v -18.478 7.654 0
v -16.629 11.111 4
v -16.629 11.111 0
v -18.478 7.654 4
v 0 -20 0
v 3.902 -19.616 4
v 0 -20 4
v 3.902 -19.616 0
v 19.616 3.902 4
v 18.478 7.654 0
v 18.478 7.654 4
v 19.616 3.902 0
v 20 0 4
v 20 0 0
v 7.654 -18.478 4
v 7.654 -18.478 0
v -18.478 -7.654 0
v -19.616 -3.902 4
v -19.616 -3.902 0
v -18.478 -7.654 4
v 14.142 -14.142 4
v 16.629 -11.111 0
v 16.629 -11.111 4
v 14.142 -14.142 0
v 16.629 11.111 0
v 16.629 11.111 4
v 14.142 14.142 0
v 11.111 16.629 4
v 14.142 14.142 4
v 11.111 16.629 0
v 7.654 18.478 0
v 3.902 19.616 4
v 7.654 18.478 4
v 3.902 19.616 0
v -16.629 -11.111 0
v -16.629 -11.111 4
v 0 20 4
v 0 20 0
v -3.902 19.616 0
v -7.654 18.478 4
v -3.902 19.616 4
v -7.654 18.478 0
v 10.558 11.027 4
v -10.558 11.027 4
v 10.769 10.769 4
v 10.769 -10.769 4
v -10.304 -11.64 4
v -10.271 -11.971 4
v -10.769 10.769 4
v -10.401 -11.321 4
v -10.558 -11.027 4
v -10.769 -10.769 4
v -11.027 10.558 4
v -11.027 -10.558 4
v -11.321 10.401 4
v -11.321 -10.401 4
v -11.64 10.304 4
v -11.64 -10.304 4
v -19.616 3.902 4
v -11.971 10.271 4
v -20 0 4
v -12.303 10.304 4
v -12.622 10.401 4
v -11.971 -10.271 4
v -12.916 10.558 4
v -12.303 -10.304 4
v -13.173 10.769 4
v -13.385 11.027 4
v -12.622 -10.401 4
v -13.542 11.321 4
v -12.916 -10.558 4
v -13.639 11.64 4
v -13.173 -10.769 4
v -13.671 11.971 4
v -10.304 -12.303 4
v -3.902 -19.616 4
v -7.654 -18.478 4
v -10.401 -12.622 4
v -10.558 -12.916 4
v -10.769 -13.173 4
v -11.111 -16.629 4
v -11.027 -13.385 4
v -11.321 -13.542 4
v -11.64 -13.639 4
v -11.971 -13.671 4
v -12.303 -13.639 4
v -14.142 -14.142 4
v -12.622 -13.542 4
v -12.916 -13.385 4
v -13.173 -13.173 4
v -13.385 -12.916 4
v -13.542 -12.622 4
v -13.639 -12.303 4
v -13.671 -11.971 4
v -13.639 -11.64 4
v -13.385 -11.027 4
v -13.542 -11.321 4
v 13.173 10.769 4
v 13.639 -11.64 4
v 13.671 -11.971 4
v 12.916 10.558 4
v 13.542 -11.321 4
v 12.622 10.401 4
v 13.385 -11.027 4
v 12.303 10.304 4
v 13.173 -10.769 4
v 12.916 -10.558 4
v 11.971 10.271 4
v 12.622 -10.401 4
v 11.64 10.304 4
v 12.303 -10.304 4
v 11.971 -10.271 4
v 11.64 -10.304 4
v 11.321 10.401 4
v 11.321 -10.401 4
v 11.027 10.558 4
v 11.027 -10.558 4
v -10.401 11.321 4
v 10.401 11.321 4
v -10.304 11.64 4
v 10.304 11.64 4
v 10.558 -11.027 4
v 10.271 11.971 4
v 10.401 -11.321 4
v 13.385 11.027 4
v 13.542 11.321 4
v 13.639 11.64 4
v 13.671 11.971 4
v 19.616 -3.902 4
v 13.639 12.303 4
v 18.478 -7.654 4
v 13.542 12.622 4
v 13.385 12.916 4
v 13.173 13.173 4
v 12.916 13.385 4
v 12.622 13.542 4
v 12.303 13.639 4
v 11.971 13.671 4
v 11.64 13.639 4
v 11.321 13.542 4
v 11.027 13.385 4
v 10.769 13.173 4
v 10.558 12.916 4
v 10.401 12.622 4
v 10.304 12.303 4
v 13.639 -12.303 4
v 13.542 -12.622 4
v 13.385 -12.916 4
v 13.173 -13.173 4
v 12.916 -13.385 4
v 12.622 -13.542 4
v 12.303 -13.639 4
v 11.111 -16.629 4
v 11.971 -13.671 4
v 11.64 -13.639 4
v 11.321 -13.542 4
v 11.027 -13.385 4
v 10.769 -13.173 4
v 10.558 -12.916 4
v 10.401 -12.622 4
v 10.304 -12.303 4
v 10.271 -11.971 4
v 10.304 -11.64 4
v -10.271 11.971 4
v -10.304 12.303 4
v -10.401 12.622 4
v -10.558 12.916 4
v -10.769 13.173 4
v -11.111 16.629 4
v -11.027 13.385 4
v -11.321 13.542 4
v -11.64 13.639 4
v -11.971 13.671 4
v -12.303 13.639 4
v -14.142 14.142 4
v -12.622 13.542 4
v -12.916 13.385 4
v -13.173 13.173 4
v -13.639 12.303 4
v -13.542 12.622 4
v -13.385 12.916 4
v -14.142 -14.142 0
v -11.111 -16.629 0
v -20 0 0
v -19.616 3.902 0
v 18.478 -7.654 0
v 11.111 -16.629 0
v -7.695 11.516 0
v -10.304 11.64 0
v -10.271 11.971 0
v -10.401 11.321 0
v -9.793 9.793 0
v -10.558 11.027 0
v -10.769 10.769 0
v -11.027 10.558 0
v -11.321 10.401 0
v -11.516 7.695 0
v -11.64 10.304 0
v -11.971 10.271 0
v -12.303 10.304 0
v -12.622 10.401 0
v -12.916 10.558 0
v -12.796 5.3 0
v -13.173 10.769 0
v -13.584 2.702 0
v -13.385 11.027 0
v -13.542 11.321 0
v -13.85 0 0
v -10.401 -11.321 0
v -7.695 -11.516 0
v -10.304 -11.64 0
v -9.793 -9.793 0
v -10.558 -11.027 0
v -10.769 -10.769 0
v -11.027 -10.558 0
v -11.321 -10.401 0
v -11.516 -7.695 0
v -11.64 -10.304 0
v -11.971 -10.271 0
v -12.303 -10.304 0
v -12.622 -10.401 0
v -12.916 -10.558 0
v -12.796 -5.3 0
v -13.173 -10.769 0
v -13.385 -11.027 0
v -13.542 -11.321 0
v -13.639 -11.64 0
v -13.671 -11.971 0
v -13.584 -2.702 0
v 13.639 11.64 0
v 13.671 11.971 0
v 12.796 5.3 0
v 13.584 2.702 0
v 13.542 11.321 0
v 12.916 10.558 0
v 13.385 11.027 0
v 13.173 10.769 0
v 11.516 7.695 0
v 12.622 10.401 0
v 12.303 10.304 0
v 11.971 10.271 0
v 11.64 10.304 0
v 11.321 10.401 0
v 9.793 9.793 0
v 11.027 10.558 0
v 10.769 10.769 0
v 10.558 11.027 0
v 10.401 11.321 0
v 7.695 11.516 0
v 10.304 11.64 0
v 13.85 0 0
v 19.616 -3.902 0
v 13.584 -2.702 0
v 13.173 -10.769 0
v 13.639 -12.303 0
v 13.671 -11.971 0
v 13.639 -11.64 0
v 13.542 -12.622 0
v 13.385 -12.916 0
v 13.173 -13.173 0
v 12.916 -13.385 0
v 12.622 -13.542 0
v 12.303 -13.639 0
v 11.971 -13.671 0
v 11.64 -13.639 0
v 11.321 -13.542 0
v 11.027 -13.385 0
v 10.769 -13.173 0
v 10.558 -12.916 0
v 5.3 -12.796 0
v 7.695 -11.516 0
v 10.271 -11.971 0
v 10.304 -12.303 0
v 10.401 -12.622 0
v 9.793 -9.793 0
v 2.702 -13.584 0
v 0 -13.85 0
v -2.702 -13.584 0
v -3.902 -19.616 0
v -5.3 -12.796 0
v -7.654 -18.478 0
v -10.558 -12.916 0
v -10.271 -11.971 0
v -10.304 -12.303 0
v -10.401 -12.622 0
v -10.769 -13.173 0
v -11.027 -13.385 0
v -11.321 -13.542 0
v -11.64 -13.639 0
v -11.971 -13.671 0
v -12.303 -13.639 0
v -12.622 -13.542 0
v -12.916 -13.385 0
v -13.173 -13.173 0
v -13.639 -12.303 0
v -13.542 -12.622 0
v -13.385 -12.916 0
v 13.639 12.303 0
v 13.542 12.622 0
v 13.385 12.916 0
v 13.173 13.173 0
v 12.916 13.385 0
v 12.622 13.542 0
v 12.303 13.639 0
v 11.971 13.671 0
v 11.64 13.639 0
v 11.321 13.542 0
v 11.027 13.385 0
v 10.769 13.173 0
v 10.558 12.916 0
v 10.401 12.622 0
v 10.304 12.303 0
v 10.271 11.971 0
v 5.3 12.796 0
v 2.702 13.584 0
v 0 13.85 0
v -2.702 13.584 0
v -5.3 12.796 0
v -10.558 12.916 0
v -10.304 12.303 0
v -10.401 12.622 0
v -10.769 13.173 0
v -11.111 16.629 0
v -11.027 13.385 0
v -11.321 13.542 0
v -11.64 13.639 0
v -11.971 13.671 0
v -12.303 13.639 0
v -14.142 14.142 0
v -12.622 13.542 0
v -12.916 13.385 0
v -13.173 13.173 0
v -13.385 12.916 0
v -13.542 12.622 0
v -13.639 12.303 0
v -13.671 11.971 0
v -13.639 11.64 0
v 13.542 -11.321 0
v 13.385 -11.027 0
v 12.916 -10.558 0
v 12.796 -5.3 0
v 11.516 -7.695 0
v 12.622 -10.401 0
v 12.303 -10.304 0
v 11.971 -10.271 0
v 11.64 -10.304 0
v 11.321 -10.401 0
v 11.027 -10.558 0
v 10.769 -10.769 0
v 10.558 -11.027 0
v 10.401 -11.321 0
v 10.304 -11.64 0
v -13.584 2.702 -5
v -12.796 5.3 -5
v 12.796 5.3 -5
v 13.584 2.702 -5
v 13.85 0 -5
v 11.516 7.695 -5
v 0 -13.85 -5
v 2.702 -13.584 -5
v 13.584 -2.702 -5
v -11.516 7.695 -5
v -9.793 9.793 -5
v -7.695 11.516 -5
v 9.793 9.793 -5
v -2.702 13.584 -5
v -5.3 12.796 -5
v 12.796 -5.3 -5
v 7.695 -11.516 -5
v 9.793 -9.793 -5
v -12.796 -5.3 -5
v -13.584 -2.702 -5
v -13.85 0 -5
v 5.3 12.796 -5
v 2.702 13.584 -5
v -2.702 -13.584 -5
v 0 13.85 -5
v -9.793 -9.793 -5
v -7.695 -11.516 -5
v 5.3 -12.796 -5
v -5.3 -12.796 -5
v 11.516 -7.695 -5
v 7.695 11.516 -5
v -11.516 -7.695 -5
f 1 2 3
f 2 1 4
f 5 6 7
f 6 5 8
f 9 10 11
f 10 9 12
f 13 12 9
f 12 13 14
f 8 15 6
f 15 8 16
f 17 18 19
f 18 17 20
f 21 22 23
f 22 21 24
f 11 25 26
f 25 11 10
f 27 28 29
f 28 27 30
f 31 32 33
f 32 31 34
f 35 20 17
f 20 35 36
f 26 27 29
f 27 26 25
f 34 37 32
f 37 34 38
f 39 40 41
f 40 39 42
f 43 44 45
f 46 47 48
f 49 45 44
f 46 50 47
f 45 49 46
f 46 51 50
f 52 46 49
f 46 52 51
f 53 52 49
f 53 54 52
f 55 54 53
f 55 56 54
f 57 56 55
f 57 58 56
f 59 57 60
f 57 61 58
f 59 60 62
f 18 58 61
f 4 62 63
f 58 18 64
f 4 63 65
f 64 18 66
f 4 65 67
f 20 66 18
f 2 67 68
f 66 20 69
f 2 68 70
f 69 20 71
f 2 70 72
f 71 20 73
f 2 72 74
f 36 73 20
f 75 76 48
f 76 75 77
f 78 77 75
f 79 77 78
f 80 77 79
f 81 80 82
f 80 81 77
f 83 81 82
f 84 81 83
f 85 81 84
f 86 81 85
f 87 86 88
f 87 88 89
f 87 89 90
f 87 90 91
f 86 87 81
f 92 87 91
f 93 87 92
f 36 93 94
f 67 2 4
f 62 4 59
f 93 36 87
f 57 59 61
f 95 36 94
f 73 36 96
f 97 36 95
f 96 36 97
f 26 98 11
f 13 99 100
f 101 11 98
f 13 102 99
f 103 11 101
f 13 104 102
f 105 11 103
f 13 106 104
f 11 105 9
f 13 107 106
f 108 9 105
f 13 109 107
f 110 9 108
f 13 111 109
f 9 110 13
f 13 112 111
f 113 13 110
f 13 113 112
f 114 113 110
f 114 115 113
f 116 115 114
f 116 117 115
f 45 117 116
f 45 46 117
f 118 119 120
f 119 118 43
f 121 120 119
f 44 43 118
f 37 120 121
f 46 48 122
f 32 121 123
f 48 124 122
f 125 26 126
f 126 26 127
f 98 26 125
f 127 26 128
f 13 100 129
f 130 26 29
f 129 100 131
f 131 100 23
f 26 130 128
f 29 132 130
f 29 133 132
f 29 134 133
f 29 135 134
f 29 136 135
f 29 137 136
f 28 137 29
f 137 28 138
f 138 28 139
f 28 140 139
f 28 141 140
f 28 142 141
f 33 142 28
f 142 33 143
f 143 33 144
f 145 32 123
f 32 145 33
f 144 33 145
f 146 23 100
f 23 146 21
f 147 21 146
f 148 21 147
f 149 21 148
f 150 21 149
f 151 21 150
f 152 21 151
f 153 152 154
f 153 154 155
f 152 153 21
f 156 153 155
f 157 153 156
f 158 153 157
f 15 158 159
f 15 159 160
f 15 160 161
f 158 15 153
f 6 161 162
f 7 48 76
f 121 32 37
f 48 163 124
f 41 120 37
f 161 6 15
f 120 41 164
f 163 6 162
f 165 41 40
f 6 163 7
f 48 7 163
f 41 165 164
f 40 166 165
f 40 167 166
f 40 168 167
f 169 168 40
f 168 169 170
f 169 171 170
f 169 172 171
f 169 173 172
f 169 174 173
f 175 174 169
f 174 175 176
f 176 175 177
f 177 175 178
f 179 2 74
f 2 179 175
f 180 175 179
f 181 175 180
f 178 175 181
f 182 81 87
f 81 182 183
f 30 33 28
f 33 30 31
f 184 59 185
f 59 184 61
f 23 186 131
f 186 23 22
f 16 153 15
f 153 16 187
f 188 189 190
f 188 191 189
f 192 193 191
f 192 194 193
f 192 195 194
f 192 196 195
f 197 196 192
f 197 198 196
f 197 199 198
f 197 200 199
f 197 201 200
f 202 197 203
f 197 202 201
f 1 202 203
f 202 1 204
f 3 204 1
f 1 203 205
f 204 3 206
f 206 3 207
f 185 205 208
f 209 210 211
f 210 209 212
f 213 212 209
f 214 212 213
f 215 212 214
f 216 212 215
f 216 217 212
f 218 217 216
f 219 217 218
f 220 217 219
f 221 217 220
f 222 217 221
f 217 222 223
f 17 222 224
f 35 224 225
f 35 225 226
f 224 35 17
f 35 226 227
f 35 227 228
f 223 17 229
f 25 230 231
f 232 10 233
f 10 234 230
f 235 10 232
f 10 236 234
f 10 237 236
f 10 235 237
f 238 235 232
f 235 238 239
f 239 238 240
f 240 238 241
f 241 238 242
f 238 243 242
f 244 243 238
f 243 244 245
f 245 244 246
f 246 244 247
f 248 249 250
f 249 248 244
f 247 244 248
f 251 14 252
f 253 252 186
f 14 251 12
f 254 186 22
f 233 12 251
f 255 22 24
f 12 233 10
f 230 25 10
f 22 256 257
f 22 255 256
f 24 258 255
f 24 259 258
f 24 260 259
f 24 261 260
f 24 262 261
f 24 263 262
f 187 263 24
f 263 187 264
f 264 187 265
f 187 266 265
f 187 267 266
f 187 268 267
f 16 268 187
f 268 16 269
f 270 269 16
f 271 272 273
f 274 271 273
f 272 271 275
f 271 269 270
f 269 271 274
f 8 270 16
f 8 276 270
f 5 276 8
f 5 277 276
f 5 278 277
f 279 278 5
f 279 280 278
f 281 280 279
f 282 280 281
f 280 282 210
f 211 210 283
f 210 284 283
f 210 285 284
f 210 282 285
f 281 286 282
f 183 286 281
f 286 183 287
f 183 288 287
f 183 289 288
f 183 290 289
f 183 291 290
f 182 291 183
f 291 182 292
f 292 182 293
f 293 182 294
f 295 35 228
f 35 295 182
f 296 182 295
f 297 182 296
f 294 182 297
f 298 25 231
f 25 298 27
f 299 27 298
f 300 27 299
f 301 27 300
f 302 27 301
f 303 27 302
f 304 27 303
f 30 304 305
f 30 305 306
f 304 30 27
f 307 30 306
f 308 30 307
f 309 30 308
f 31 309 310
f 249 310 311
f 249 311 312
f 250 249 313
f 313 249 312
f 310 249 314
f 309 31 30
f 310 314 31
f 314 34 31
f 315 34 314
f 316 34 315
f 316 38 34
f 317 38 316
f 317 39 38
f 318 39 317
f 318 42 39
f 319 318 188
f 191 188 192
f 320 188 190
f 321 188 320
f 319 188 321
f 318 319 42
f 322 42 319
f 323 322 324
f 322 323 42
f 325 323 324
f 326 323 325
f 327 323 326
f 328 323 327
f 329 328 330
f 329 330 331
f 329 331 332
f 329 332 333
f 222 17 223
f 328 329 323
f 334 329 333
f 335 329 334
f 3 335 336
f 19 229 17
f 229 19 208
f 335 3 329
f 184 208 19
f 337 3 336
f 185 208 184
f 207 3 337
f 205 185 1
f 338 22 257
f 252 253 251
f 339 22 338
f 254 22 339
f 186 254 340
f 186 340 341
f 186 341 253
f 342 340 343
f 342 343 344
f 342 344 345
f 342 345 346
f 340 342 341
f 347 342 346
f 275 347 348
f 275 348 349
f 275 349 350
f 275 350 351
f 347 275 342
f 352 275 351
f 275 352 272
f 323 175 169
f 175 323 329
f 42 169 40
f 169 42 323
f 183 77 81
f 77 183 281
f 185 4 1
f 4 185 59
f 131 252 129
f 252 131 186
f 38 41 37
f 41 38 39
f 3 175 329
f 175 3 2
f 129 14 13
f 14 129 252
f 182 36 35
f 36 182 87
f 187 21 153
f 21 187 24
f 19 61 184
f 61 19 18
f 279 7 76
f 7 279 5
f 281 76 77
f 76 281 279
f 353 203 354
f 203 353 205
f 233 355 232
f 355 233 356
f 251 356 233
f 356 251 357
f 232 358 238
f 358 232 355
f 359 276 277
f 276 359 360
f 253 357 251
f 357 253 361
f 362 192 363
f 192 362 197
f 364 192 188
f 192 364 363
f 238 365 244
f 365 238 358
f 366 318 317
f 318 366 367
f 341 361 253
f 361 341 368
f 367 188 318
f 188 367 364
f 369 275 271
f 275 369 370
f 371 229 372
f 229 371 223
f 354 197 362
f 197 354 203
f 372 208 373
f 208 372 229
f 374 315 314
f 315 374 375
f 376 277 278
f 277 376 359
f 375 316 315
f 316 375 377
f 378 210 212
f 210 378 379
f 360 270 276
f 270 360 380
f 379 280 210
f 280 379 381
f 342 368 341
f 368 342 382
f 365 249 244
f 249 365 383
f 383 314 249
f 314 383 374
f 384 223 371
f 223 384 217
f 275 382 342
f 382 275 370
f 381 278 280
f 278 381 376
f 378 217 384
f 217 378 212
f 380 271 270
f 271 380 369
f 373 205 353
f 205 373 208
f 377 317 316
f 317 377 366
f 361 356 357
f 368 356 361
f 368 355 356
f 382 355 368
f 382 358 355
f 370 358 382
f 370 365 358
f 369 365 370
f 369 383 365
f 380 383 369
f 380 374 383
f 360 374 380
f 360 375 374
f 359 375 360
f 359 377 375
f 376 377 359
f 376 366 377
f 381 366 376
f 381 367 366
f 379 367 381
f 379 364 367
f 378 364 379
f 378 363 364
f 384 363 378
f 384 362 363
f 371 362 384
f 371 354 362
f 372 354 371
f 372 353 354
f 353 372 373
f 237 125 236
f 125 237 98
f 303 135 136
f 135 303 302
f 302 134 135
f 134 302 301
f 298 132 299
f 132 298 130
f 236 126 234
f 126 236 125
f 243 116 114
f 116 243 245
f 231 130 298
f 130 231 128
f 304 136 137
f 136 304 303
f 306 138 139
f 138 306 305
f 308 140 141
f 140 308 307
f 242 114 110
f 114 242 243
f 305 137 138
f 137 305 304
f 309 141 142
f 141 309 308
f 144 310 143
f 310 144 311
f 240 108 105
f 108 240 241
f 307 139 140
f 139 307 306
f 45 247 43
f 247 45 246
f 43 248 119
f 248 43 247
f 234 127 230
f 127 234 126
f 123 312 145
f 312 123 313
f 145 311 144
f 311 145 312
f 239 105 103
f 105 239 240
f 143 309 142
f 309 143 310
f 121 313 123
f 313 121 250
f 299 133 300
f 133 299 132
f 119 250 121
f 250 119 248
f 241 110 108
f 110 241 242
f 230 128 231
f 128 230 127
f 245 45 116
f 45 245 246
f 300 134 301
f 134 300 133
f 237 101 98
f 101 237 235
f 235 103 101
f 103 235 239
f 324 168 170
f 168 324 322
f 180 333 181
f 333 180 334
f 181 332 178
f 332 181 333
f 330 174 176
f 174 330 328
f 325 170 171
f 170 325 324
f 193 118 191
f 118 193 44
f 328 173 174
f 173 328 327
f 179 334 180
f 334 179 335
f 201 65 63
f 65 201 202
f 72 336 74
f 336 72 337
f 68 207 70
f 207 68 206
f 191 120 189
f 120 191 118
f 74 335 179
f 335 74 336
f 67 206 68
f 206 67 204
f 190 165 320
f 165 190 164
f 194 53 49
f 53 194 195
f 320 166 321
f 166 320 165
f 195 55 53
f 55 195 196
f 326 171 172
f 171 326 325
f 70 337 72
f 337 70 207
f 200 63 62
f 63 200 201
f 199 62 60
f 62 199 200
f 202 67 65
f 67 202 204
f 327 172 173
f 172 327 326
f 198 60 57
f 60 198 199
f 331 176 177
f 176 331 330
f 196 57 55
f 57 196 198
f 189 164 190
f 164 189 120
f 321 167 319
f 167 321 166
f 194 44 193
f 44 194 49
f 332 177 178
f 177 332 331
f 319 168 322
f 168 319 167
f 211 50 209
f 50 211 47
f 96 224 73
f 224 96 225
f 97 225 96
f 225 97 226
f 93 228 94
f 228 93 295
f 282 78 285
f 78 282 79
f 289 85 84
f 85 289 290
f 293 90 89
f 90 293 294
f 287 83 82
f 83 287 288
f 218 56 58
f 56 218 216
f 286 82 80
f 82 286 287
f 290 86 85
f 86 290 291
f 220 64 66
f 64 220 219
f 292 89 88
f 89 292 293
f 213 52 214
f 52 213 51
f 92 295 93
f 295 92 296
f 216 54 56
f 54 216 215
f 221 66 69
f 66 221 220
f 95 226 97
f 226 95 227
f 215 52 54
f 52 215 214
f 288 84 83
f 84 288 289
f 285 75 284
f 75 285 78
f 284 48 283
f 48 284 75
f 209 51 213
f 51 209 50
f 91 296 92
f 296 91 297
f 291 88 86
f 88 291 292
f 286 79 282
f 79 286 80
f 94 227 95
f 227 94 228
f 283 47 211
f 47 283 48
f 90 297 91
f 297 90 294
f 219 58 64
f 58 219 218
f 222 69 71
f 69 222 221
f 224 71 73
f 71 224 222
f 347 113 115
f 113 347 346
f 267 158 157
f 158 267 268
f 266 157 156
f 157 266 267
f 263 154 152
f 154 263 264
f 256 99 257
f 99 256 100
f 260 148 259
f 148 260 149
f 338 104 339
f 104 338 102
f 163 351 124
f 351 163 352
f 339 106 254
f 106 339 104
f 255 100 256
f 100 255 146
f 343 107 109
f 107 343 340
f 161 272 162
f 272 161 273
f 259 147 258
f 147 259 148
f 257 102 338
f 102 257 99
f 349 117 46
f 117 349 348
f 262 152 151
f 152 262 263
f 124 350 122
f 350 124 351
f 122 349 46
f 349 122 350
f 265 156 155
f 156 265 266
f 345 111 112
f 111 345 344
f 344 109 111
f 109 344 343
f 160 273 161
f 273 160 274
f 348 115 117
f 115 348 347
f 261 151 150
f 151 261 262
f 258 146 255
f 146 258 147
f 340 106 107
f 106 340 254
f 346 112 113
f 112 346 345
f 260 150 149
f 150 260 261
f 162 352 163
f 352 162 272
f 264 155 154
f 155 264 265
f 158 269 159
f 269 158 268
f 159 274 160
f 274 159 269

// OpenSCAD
$fn = 32;

// ----------------------------------------------------------------------
// Retaining cap: 6001 cover, 40 mm, spigot 27.7 mm
// ----------------------------------------------------------------------

// --- parameters (mm) ---
plate_d = 40;             // cover diameter
plate_t = 4;              // cover thickness
boss_d = 27.7;            // spigot that enters the housing
boss_h = 5;               // spigot height
bolt_d = 3.4;             // bolt clearance
bolt_r = 16.93;           // bolt circle radius

module cover() {
  cylinder(h = plate_t, d = plate_d);
}

module spigot() {
  /* sunk 1 mm into the cover; the spigot sets the overall height */
  translate([0, 0, -boss_h]) cylinder(h = boss_h + 1, d = boss_d);
}

difference() {
  union() {
    cover();
    spigot();
  }
  for (i = [0 : 3]) rotate([0, 0, 45 + i * 90]) translate([bolt_r, 0, -boss_h - 1])
    cylinder(h = boss_h + plate_t + 2, d = bolt_d);
}
